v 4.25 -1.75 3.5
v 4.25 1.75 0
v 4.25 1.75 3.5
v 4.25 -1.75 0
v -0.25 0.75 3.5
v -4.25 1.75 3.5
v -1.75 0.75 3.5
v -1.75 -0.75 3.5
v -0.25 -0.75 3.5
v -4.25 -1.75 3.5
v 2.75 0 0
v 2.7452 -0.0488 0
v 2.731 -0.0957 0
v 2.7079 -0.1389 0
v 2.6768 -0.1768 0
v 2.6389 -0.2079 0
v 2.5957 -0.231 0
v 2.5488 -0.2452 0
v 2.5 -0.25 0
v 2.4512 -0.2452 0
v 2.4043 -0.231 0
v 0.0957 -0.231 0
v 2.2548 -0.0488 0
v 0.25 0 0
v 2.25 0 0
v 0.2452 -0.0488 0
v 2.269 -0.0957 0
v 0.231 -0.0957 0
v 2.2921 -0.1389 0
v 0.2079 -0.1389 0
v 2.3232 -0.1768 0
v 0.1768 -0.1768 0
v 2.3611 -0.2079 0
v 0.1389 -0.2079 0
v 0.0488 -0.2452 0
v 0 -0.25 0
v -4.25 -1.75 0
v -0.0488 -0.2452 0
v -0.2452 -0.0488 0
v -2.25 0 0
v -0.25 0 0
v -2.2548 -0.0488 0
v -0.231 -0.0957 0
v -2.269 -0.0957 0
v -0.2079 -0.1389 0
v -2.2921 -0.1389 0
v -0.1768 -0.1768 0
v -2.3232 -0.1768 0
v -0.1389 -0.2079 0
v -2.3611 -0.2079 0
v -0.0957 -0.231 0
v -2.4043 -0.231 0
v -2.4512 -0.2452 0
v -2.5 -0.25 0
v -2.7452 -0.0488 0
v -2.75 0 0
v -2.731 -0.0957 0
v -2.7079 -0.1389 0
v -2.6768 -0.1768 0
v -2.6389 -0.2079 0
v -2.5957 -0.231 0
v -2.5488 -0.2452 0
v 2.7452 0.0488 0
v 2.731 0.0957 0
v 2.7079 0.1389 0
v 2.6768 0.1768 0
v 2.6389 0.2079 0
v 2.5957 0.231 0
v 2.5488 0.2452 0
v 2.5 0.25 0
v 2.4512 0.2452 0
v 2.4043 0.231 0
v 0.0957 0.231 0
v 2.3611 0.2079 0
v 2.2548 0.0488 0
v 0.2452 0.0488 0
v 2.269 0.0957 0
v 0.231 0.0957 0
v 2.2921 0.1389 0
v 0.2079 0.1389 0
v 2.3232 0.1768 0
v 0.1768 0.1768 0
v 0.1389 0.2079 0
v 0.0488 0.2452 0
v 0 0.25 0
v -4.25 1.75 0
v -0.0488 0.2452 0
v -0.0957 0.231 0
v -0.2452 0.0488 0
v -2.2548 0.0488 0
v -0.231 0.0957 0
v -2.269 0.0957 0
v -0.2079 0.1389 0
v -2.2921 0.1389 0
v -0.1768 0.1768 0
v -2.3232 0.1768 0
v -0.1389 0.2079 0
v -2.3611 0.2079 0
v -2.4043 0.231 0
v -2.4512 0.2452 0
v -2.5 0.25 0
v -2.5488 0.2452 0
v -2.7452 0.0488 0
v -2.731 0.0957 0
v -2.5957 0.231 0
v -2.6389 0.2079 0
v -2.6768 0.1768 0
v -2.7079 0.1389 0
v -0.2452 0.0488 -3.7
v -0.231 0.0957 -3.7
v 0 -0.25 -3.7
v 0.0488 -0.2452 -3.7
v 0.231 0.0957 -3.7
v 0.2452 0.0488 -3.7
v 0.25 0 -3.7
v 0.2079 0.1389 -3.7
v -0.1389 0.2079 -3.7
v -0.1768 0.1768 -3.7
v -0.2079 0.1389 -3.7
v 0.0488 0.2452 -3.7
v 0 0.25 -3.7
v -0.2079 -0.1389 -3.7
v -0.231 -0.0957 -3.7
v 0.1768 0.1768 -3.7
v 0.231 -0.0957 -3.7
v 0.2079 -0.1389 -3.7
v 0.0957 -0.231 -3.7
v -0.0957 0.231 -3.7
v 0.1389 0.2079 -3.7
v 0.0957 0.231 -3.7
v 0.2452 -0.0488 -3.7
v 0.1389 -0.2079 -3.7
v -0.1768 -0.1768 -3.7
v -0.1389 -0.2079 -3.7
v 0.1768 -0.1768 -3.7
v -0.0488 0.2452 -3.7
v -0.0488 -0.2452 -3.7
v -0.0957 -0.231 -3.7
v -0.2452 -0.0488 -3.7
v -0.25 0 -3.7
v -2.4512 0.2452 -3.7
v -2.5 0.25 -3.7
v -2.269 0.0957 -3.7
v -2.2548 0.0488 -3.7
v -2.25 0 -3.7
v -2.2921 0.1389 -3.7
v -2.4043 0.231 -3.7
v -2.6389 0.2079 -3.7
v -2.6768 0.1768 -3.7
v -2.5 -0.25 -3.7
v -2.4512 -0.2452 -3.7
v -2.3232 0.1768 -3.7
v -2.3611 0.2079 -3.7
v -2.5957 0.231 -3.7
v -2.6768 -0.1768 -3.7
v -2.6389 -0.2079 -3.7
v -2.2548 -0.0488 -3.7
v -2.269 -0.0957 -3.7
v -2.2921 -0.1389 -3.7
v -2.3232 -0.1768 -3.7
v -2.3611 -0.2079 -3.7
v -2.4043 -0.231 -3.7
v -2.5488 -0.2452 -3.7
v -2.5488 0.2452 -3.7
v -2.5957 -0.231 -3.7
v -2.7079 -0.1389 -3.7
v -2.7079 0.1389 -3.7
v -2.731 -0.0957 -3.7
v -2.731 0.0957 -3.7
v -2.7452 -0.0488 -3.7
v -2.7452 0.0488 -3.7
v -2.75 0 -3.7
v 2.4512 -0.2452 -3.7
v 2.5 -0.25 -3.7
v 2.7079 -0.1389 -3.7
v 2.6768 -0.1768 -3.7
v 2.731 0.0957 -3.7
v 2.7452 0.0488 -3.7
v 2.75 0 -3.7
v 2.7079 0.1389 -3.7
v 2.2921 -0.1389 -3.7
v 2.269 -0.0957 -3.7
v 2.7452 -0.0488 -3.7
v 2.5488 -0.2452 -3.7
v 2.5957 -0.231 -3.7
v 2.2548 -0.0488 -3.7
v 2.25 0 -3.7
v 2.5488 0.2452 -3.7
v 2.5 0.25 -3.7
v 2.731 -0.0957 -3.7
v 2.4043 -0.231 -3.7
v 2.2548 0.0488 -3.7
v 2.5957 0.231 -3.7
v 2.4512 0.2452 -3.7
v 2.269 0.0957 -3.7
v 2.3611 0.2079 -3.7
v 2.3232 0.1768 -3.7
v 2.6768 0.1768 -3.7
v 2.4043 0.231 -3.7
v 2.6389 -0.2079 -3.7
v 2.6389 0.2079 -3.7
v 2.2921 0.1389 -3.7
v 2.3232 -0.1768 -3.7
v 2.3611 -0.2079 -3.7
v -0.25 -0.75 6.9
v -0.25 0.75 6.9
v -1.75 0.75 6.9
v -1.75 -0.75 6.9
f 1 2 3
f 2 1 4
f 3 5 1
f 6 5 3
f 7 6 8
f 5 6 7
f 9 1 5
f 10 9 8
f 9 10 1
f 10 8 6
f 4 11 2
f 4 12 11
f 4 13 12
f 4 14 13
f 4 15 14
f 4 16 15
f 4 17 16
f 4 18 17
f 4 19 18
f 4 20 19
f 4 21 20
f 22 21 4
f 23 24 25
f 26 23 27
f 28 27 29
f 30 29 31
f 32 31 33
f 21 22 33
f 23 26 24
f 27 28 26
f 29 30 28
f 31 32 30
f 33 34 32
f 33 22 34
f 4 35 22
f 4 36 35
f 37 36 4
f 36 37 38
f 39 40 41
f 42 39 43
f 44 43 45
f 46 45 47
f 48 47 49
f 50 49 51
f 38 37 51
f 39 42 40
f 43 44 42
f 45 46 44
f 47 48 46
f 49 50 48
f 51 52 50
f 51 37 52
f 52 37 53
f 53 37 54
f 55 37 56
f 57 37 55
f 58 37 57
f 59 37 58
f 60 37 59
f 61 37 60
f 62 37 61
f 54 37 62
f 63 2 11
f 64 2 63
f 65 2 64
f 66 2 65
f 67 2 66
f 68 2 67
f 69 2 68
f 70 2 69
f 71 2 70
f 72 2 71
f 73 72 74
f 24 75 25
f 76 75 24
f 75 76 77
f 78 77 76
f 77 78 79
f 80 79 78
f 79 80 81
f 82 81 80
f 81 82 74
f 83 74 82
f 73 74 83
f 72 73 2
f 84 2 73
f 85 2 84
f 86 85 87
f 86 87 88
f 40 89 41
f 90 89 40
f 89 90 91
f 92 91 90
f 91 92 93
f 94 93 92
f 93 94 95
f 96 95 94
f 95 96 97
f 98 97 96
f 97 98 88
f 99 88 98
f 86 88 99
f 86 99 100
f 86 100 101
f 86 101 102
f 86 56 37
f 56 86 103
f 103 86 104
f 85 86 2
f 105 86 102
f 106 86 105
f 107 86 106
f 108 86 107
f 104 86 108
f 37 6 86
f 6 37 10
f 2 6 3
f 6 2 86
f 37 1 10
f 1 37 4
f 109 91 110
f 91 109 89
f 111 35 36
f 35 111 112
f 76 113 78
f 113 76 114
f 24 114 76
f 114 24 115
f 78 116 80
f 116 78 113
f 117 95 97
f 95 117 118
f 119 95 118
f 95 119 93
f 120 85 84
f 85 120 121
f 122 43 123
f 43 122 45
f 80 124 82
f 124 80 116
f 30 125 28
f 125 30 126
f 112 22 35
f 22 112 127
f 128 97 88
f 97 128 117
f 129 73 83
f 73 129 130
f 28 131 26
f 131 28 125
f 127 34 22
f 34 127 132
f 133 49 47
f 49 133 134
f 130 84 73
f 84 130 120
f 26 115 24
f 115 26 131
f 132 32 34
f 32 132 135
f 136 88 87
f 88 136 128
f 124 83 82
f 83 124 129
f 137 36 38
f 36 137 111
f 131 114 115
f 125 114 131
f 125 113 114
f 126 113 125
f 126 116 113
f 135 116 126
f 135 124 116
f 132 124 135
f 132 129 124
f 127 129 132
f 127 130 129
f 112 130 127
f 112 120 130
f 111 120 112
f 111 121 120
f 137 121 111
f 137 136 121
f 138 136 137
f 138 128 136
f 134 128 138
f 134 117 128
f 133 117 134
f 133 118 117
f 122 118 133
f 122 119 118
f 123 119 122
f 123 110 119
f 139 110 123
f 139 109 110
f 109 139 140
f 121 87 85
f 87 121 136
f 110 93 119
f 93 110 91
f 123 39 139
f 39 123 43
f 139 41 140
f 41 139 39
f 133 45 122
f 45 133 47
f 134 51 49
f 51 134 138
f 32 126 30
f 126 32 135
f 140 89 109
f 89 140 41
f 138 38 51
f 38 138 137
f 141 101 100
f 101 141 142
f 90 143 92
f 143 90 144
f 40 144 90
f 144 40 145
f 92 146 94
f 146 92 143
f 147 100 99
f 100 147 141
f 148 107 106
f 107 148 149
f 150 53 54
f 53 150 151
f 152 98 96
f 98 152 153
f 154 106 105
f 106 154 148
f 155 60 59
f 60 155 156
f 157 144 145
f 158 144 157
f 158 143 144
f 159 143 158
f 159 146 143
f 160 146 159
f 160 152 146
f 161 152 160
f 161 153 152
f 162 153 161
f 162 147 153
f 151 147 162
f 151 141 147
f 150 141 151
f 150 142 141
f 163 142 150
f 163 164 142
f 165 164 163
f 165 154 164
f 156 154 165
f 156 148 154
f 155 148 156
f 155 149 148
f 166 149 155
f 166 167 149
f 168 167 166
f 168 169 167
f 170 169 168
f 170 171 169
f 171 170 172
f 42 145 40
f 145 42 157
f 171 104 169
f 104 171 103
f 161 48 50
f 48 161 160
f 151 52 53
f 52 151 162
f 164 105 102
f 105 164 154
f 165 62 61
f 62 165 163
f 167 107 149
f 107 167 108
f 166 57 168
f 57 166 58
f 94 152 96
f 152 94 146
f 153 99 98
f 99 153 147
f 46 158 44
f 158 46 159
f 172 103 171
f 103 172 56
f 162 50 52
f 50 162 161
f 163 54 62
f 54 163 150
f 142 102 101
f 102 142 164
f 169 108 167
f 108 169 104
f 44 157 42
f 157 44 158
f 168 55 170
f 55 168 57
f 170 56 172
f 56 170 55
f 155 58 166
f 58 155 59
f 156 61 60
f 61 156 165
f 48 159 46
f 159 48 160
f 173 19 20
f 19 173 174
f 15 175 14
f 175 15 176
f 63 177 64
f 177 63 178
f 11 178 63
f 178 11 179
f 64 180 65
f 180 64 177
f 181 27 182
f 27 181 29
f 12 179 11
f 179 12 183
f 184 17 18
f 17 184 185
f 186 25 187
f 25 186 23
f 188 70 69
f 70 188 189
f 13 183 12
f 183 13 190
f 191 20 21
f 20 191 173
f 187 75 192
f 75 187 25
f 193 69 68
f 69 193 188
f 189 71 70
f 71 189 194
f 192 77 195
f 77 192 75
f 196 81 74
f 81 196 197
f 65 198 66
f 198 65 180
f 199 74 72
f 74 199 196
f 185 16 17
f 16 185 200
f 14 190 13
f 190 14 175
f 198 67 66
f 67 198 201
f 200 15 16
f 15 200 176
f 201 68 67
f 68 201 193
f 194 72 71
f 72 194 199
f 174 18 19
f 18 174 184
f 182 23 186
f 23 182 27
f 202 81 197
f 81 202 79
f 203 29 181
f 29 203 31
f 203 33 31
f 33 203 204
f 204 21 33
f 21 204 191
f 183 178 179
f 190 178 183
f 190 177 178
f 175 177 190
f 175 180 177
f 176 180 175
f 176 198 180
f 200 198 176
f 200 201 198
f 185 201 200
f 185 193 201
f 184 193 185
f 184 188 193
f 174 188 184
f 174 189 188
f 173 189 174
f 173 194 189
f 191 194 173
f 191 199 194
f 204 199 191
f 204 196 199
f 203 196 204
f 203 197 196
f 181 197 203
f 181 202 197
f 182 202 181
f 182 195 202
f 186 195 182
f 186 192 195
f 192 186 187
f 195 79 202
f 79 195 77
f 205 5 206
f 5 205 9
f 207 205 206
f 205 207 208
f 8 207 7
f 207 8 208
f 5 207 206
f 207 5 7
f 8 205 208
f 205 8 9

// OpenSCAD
e = 0.1;
$fn = 32;

wid = 8.5;
len = 3.5;
hgt = 3.5;

pin_dia = 0.5;
pin_len = (7.2-3.5);
pin_spc = 2.5;

t_trav = 1.0;
t_xy = 1.5;
t_len = 3.5;

module pin_at( x, y) {
     translate( [x, y, -pin_len])
	  cylinder( h=pin_len+e, d=pin_dia);
}

module body() {
     translate( [-wid/2, -len/2, 0])
	  cube( [wid, len, hgt]);
     pin_at( 0, 0);
     pin_at( -pin_spc, 0);
     pin_at( pin_spc, 0);
     translate( [-t_trav-t_xy/2, -t_xy/2, hgt-e])
	  cube( [t_xy, t_xy, t_len]);
}

body();
